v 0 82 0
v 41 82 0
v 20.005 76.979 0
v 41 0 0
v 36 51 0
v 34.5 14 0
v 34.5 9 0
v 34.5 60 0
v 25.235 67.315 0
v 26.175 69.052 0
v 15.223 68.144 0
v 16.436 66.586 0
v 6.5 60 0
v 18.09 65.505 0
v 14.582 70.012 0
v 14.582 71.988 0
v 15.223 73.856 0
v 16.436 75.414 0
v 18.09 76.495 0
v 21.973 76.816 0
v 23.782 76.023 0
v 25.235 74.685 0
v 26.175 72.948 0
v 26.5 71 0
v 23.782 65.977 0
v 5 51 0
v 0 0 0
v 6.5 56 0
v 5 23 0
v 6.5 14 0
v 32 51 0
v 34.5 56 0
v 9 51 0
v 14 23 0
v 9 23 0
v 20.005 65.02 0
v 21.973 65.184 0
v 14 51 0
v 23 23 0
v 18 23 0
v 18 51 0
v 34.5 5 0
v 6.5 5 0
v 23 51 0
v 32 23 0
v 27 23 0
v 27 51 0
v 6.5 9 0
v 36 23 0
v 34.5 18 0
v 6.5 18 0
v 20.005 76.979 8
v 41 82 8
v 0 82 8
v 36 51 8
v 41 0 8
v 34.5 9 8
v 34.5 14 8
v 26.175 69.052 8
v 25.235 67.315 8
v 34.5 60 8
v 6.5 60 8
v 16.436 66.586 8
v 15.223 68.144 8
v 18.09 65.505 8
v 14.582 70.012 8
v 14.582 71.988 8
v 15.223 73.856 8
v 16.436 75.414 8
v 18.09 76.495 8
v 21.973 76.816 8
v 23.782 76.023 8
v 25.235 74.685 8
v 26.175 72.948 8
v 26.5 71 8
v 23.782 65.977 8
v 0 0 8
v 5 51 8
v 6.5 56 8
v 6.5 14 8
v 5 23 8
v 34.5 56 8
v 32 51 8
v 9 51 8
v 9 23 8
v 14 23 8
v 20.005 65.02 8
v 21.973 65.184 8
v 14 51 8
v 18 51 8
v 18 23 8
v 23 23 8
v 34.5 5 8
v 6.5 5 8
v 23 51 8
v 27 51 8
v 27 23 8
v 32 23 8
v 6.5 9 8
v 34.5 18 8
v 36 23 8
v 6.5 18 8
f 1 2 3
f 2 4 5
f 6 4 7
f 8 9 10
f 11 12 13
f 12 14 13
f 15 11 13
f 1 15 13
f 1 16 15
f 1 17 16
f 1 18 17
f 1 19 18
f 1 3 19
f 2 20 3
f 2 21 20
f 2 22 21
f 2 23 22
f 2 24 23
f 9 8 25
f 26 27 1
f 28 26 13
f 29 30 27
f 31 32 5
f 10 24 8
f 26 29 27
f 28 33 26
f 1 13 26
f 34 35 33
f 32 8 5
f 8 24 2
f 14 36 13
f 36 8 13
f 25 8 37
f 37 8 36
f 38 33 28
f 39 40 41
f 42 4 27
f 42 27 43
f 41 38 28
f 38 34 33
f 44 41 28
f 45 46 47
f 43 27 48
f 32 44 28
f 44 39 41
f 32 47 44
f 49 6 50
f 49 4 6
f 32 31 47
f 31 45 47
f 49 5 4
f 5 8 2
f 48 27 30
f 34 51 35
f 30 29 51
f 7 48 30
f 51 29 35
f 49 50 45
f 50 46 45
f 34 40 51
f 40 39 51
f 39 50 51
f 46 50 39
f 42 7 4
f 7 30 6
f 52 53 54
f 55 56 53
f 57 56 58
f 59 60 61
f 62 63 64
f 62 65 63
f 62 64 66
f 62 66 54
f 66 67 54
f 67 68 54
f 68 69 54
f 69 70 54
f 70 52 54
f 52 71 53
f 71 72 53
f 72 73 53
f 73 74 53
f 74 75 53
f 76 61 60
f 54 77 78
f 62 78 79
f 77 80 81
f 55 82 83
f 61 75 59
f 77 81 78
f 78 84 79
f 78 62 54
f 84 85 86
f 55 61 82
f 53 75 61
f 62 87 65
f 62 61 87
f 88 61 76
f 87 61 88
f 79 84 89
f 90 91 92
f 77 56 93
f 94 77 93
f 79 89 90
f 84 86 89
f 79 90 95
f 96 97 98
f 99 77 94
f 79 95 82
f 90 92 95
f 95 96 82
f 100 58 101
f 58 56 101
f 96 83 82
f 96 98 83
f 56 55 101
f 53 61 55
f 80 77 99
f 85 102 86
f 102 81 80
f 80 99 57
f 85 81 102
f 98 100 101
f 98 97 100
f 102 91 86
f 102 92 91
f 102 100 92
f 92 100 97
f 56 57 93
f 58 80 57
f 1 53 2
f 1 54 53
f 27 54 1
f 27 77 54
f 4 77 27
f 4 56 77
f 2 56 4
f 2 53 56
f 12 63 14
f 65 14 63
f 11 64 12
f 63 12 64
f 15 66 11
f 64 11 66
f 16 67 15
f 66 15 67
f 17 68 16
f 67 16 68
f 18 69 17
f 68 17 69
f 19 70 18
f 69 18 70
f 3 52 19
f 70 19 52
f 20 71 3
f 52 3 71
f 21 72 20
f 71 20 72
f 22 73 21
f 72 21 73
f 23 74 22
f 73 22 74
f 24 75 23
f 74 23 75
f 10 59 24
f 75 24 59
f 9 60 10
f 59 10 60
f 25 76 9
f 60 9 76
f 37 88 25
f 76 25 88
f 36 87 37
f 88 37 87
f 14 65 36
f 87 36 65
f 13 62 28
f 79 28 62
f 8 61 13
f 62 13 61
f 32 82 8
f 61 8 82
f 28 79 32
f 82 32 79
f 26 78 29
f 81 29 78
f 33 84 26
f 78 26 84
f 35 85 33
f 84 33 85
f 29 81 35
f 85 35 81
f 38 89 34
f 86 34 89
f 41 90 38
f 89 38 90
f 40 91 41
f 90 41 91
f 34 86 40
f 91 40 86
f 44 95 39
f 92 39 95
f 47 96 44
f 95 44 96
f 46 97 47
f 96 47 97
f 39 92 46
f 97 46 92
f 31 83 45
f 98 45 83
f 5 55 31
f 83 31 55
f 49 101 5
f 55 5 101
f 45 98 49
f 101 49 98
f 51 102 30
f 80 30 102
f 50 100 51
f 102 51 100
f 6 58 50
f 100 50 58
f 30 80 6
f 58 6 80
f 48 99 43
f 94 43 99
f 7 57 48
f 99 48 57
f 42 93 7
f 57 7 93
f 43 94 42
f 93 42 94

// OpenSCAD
webbing = 28;
gap = 4;
wall = 5;
height = 8;
hole = 6;

%cube([webbing, webbing, gap/2]);

width = (gap*4) + (wall*5); // webbing + (wall*2);
length = webbing + (gap*3) + (wall*6) + (hole*2);

linear_extrude(height=height)
difference() {
  square([width, length]);
  
  // Width Webbing Slots
  translate([width/2 - webbing/2,0]) {
    translate([0, wall])
    square([webbing, gap]);

    translate([0, gap + (wall*2)])
    square([webbing, gap]);

    translate([0, webbing + (gap*2) + (wall*4)])
    square([webbing, gap]);
  }

  // Center Webbing Slots
  translate([0,(gap*2) + (wall*3)])
  for (i = [0:3]) {
    translate([(gap*i) + (wall*(i+1)), 0])
    square([gap, webbing]);
  }

  // String Hole
  translate([width/2,length - hole - wall,0])
  #circle(r=hole);
}
